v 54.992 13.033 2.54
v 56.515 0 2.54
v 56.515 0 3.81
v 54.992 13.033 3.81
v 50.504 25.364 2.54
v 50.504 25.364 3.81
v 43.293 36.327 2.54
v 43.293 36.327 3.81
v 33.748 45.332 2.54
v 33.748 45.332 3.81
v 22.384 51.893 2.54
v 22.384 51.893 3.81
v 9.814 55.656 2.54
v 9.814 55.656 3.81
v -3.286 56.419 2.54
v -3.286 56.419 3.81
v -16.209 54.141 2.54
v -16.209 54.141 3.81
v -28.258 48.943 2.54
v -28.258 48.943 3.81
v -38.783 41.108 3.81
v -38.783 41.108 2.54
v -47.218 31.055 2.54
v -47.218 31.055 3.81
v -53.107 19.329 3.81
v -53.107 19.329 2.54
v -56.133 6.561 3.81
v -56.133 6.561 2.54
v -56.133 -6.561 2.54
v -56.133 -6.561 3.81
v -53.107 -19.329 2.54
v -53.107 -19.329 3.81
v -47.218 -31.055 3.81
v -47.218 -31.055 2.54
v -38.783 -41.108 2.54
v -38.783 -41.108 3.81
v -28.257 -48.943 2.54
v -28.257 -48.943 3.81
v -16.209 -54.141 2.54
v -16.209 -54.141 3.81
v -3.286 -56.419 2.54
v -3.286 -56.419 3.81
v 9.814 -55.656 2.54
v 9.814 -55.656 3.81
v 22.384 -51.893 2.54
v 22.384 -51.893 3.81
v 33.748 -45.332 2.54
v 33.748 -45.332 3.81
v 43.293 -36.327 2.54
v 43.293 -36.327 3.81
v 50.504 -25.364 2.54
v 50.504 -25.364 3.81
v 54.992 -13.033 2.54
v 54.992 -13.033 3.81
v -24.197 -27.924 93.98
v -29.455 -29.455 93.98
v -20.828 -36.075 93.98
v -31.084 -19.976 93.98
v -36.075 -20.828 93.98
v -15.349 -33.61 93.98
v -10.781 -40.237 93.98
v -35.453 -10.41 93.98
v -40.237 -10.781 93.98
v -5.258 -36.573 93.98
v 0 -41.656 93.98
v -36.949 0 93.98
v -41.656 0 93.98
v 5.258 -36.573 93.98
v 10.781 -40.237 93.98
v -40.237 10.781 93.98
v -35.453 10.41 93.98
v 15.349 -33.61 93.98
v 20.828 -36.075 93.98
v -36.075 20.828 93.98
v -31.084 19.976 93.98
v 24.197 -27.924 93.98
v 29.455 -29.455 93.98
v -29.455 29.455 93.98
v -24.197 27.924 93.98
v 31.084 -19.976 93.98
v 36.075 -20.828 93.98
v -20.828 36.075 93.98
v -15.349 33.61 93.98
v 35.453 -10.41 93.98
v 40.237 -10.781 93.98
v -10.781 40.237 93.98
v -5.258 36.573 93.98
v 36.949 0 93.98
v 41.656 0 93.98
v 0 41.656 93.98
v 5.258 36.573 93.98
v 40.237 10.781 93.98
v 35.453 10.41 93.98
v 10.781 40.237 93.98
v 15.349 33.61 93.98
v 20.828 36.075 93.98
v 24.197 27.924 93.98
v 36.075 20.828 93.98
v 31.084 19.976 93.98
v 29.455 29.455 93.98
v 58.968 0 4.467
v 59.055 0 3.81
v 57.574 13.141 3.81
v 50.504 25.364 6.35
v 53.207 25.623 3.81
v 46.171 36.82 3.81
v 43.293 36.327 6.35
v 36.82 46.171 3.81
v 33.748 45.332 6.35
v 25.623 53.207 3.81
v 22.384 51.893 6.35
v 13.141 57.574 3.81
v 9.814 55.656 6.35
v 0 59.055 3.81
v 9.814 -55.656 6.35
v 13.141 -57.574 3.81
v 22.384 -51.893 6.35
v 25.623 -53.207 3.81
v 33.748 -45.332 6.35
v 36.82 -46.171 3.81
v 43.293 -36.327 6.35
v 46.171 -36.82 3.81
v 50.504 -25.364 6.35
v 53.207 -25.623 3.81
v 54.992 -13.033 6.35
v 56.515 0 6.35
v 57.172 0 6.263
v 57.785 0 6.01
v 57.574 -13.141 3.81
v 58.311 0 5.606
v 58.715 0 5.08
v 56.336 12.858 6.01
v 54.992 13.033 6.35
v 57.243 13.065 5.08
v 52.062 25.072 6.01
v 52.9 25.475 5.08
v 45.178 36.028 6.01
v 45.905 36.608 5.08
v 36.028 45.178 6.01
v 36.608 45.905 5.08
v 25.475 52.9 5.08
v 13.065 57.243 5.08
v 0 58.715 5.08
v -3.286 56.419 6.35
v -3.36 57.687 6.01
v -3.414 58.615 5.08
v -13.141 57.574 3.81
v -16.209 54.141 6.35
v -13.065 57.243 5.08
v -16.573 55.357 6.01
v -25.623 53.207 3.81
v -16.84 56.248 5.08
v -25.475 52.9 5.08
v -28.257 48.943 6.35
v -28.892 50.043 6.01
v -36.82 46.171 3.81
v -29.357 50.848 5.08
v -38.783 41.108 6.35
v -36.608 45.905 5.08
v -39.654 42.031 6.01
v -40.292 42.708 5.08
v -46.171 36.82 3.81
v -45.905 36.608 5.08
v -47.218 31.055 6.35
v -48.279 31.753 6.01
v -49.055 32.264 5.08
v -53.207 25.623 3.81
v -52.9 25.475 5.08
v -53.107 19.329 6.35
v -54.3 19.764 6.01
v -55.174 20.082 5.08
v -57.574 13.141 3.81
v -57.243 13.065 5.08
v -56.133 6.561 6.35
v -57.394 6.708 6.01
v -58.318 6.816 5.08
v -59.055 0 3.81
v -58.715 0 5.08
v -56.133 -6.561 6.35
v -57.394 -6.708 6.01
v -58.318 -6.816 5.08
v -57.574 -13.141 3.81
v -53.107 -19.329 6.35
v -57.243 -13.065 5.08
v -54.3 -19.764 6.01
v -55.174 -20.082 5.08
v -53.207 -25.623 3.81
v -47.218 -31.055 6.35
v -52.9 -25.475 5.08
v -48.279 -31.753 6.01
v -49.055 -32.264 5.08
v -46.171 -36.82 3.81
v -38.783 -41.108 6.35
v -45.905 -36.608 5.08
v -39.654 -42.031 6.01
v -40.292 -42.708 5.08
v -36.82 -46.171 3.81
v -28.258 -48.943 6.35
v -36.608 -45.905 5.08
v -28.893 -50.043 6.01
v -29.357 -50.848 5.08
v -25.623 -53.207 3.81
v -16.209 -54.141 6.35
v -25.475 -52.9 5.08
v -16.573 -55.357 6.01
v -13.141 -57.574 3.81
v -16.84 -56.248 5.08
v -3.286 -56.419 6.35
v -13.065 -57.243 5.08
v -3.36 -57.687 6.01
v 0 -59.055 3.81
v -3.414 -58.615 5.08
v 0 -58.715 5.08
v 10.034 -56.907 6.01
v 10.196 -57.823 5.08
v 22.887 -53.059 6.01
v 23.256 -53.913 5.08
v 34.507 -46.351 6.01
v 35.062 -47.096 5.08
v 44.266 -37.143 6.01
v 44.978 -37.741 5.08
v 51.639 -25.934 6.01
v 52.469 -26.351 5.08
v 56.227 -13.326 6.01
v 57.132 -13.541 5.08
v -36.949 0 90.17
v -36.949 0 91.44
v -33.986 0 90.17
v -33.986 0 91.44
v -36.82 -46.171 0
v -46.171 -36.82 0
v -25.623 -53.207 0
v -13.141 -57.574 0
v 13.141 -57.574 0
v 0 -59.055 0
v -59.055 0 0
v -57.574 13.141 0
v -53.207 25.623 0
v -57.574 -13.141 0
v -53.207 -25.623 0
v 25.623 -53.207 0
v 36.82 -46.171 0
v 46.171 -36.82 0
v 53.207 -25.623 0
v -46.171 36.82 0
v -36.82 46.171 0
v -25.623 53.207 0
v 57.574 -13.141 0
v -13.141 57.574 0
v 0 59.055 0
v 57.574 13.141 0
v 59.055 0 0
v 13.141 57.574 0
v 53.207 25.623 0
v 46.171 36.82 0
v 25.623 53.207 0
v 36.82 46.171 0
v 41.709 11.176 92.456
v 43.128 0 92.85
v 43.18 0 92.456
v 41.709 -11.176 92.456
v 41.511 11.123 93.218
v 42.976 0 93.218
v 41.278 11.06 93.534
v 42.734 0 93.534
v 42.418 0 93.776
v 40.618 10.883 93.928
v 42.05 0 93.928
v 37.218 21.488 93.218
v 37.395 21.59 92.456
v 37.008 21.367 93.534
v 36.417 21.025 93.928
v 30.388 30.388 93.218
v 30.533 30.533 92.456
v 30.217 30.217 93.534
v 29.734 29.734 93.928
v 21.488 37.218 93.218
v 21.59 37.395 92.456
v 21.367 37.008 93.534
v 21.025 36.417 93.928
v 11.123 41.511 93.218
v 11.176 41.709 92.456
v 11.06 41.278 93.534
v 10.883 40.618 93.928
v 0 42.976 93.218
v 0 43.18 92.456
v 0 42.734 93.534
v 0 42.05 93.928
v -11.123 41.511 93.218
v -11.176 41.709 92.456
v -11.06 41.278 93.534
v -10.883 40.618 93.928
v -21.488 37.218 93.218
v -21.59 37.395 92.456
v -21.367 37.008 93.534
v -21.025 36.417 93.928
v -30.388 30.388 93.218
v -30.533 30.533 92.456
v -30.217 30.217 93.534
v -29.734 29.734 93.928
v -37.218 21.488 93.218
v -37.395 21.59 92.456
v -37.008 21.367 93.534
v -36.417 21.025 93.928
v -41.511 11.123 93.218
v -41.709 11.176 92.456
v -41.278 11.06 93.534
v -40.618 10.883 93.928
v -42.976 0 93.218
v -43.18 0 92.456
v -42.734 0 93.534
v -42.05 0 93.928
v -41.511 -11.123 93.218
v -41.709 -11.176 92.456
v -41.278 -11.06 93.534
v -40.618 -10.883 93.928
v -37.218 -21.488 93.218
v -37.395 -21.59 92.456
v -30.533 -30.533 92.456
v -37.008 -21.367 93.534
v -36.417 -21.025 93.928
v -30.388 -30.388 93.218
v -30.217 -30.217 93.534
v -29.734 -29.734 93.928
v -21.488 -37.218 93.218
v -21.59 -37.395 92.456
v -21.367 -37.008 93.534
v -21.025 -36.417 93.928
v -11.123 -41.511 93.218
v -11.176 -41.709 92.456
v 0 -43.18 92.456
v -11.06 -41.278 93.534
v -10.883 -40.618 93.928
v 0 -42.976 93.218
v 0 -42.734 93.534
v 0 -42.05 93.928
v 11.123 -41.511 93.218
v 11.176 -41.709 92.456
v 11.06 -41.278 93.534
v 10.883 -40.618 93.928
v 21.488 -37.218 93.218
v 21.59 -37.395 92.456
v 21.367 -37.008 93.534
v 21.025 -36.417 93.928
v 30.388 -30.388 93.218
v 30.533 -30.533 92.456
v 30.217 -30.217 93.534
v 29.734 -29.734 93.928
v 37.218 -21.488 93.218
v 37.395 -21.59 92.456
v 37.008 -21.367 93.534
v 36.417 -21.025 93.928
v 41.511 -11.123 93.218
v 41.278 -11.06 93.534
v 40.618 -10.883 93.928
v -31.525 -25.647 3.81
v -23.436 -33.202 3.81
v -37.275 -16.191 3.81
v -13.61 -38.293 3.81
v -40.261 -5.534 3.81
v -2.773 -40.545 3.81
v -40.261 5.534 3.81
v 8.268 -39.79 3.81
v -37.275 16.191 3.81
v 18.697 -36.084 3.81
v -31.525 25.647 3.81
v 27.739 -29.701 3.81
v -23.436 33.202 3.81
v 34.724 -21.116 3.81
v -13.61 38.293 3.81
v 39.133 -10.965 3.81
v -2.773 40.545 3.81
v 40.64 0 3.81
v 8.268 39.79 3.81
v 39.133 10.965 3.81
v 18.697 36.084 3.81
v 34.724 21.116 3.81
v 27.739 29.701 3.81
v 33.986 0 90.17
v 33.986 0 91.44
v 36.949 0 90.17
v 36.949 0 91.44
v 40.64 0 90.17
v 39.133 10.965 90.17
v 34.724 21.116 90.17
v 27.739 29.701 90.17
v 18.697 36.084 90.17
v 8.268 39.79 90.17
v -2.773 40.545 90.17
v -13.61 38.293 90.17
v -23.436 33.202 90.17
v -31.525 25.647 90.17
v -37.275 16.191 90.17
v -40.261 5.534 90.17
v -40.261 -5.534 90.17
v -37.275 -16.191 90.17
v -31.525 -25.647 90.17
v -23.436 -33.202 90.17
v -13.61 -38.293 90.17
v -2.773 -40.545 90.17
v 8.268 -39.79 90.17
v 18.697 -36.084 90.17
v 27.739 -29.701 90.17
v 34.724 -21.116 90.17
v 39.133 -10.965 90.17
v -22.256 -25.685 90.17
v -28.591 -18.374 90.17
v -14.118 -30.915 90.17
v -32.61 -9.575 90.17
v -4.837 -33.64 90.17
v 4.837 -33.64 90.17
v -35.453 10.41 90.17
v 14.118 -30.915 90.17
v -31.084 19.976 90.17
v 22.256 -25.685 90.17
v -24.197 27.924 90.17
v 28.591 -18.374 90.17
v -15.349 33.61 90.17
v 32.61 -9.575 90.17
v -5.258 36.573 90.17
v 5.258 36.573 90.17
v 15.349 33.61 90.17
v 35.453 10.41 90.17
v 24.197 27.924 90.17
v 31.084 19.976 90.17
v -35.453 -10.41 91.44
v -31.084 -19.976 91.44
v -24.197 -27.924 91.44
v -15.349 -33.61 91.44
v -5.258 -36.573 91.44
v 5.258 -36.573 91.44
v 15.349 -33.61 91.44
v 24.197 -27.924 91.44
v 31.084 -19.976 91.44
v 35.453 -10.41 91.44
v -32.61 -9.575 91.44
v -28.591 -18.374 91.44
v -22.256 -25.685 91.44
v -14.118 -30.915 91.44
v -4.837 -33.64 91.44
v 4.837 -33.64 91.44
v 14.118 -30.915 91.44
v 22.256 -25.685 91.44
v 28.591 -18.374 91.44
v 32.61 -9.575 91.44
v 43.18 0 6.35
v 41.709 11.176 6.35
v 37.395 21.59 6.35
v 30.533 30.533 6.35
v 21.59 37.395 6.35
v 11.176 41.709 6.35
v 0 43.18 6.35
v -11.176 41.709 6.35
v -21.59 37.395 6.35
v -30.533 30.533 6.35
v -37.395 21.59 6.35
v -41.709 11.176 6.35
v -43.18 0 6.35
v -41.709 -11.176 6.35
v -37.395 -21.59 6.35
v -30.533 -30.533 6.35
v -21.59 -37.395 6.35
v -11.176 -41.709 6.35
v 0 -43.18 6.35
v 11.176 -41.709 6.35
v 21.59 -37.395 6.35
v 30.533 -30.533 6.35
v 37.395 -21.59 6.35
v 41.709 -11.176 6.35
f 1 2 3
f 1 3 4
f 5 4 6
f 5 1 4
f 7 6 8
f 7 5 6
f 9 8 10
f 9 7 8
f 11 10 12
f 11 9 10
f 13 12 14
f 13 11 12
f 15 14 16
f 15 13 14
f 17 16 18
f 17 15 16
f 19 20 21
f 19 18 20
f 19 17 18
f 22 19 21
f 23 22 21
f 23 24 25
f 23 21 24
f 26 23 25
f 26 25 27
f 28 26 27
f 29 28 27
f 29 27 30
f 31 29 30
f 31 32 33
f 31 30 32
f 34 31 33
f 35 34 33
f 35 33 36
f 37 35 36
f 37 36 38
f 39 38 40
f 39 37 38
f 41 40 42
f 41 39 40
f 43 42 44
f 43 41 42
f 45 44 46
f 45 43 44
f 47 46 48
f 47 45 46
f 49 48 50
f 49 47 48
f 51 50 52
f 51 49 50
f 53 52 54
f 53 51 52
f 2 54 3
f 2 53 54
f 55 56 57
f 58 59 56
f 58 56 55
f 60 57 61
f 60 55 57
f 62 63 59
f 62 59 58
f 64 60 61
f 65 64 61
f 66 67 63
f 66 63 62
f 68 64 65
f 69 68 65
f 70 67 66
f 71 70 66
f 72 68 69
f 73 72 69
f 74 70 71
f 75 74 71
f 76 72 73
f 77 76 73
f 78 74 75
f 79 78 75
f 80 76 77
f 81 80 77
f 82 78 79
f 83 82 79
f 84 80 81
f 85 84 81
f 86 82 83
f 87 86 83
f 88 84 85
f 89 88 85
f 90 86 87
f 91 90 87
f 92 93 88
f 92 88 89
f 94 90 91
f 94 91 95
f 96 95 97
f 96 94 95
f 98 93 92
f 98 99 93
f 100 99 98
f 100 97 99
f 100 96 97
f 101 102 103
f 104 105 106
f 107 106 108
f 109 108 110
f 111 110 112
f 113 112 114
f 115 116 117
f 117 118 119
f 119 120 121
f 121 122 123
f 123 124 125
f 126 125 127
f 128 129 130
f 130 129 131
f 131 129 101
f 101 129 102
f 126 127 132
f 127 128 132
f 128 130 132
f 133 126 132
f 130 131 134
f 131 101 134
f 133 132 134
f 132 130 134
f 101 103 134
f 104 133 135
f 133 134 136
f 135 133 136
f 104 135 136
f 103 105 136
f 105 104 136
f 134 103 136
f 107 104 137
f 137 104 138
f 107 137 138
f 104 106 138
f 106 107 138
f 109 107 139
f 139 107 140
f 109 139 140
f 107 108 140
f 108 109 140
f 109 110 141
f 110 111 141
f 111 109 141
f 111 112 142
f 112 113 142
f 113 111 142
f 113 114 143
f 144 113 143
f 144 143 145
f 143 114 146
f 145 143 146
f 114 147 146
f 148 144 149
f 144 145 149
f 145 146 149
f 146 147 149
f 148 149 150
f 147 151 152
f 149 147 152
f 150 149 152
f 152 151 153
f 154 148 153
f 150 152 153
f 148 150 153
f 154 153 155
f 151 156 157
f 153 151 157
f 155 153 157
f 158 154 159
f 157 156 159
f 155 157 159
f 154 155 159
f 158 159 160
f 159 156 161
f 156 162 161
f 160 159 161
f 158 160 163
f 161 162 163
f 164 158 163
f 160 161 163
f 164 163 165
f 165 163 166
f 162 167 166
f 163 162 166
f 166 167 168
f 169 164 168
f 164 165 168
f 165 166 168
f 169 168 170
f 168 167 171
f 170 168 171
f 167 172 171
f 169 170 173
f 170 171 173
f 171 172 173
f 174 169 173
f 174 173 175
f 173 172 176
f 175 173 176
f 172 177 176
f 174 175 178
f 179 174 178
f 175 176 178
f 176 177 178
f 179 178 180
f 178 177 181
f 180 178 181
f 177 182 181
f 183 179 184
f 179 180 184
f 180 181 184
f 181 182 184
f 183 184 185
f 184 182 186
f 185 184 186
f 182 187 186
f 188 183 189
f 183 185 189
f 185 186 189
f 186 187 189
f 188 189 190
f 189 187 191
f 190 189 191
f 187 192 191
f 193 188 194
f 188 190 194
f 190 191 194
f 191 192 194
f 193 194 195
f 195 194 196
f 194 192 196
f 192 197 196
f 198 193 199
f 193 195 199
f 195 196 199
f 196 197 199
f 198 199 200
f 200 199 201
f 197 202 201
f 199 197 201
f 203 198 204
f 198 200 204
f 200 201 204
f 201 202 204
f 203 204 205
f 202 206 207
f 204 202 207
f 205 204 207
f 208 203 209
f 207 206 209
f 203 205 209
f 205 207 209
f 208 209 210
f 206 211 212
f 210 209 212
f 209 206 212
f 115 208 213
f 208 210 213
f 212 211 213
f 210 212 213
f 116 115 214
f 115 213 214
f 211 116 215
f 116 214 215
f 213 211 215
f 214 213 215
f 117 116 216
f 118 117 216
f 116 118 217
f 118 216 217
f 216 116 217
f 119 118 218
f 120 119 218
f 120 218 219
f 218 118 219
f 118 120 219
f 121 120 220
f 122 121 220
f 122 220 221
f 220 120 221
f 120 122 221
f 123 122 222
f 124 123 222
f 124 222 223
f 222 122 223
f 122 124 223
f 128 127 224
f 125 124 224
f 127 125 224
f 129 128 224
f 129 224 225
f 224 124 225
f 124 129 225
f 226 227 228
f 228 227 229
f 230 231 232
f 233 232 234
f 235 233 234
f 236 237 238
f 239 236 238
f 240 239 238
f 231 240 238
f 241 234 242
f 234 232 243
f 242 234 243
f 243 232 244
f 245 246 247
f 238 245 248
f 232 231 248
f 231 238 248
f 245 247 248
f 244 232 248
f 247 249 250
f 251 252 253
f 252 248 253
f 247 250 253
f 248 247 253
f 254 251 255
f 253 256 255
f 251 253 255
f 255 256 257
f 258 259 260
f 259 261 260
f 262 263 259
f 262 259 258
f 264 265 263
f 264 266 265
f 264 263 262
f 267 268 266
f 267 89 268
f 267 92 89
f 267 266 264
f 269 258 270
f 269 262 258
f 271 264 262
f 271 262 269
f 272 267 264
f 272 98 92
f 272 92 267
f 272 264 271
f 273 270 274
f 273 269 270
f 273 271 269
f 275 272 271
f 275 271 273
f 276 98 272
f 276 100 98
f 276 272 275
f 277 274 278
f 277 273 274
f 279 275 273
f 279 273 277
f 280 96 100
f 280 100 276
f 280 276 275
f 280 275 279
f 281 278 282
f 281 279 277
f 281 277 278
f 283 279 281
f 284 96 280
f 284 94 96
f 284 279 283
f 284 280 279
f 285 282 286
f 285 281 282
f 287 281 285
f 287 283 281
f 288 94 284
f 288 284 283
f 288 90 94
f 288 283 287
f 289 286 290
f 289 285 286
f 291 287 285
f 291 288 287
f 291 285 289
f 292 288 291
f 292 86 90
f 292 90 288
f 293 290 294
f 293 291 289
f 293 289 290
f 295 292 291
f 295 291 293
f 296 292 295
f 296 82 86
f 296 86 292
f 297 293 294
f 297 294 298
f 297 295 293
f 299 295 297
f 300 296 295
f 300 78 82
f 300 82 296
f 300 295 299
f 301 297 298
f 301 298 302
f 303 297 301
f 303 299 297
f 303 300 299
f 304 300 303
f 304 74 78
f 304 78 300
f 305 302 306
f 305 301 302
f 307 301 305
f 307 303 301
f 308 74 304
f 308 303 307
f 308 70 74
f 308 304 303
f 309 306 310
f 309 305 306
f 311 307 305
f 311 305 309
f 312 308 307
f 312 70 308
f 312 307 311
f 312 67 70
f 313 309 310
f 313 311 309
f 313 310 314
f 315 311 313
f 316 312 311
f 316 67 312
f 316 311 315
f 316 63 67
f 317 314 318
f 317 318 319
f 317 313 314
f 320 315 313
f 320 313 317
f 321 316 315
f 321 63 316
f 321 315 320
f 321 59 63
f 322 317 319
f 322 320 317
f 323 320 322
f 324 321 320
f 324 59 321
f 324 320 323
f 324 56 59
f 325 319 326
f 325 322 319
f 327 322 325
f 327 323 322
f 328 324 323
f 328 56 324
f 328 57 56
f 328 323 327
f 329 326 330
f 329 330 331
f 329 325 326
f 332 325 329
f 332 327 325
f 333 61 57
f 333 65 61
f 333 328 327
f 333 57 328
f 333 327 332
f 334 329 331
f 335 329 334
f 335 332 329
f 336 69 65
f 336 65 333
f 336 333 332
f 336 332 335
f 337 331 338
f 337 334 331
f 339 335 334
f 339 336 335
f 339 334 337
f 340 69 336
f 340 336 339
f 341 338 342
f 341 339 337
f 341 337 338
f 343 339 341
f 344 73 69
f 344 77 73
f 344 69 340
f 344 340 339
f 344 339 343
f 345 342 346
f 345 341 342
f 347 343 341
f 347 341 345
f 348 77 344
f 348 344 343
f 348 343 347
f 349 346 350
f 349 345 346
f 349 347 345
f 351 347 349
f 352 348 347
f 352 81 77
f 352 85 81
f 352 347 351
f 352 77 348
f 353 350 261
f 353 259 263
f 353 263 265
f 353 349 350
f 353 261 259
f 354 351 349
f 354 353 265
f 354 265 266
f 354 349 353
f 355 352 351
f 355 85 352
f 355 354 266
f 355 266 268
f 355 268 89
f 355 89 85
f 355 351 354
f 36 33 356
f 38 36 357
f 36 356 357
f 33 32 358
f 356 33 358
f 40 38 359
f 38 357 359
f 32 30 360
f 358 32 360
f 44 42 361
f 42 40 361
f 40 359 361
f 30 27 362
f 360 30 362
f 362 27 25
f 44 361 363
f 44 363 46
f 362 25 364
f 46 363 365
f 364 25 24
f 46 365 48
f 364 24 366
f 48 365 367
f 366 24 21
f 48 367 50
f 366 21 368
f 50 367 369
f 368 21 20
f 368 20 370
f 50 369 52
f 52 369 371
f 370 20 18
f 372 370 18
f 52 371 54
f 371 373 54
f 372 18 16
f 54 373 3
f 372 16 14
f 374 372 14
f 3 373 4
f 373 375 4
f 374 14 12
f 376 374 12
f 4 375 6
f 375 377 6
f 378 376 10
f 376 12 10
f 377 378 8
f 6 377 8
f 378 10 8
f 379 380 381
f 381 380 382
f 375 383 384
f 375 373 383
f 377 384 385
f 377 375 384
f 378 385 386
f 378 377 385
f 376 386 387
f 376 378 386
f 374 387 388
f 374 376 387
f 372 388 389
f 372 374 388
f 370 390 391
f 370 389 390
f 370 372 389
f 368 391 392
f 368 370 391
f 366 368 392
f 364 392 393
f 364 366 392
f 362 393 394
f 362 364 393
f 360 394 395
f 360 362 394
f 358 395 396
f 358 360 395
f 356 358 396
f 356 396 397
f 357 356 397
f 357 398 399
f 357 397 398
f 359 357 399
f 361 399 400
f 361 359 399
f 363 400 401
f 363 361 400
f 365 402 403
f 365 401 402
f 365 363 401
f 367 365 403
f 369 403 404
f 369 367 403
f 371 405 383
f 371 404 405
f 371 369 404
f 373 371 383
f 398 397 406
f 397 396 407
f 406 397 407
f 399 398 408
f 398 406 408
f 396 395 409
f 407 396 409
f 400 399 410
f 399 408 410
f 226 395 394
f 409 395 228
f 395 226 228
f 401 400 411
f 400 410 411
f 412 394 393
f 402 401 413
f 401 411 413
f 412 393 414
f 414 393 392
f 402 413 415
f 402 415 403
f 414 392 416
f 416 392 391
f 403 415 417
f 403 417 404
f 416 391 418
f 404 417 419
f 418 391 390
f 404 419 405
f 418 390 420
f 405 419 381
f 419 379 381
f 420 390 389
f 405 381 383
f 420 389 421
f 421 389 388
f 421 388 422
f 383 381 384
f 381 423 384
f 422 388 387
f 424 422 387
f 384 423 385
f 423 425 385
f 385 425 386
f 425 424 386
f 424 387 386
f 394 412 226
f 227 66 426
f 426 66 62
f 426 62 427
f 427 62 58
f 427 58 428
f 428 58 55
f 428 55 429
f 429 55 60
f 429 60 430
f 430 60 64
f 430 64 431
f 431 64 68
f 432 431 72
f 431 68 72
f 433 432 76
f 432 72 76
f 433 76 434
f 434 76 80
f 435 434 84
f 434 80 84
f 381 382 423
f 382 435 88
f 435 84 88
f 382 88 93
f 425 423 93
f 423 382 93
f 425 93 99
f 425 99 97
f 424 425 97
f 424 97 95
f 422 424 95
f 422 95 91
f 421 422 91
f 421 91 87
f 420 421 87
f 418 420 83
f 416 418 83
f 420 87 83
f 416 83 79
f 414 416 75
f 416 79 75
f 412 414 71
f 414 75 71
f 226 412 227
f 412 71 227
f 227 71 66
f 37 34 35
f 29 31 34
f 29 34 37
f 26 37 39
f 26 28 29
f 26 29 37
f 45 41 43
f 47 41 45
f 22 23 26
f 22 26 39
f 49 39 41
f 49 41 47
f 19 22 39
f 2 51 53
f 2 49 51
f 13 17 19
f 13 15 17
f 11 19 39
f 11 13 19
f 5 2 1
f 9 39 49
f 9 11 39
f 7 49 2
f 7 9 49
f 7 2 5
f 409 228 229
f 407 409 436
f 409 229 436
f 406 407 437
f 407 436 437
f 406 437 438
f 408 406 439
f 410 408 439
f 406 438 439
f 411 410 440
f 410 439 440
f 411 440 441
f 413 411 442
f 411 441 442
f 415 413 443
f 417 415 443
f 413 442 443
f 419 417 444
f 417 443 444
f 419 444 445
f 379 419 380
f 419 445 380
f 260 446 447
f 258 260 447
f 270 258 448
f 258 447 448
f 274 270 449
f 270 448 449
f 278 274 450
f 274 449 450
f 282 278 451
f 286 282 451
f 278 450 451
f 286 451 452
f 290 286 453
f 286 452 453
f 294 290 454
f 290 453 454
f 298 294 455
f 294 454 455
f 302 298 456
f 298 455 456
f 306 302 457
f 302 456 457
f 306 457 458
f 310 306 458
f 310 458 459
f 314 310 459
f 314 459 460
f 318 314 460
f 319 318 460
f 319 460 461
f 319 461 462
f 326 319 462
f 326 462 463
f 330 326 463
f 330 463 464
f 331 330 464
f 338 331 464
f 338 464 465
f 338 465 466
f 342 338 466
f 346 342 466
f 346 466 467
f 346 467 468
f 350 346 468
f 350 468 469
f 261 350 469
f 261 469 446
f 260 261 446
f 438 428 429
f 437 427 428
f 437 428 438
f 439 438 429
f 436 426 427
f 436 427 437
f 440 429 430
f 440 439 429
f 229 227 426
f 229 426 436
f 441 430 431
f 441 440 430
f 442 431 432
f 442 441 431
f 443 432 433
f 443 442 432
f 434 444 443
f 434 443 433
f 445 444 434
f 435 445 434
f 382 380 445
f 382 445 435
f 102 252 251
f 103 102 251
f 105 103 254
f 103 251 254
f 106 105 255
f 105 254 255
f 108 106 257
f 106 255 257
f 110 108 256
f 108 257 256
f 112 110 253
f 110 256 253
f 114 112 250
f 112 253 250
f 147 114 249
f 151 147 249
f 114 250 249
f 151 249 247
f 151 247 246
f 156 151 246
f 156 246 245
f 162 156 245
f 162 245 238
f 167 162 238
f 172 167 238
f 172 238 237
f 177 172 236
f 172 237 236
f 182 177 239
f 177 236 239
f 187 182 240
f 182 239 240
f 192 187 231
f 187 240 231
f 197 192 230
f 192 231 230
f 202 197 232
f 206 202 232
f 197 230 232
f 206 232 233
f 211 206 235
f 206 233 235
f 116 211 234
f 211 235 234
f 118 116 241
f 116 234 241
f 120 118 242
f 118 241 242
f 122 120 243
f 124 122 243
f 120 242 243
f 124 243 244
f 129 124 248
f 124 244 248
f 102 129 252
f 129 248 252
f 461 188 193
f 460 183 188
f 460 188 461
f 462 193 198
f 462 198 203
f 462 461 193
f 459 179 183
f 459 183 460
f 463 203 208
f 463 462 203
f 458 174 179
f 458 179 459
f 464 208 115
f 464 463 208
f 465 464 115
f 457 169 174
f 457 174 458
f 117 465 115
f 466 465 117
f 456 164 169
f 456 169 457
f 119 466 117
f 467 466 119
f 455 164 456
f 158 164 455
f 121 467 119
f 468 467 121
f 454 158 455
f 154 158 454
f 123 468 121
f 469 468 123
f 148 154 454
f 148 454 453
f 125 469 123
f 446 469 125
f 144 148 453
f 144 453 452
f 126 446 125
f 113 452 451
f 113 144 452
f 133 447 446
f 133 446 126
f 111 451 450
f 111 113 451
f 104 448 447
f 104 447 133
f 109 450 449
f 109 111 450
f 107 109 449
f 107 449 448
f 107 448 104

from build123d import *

# Parameters (mm, degrees)
F0_R     = 43.18
F1_DEPTH = 90.17
F0_R_2   = 59.055
F2_DEPTH = 6.35
F3_T     = -2.54
F4_R     = 43.18
F5_DEPTH = 3.81
F7_DEPTH = 3.81
F8_DEPTH = 2.54
F9_R     = 2.54
F10_R    = 1.524


with BuildPart() as f1:
    # F0 (on Top) → F1 (new body)
    with BuildSketch(Plane.XY):
        Circle(F0_R)
    extrude(amount=F1_DEPTH)

    # F0 (on Top) → F2 (join)
    with BuildSketch(Plane.XY):
        Circle(F0_R_2)
        Circle(F0_R, mode=Mode.SUBTRACT)
    extrude(amount=F2_DEPTH)

    # F3
    f3_openings = [f1.faces().sort_by_distance(p)[0] for p in [
        (0, 0, 90.17),
    ]]
    offset(amount=F3_T, openings=f3_openings, kind=Kind.INTERSECTION)

    # F4 (on face) → F5 (join)
    with BuildSketch(Plane.XY.offset(90.17)):
        Circle(F4_R)
    extrude(amount=F5_DEPTH)

    # F6 (on face) → F7 (cut, through all)
    with BuildSketch(Plane.XY.offset(93.98)):
        with BuildLine():
            ThreePointArc((-33.986308275, 0), (0, -33.986308275), (33.986308275, 0))
            ThreePointArc((33.986308275, 0), (0, 33.986308275), (-33.986308275, 0))
        make_face()
        with BuildLine():
            Line((33.986308275, 0), (36.9492512699, 0))
            ThreePointArc((36.9492512699, 0), (0, 36.9492512699), (-36.9492512699, 0))
            Line((-36.9492512699, 0), (-33.986308275, 0))
            ThreePointArc((-33.986308275, 0), (0, 33.986308275), (33.986308275, 0))
        make_face()
    extrude(amount=-F7_DEPTH, mode=Mode.SUBTRACT)

    # F6 (on face) → F8 (cut)
    with BuildSketch(Plane.XY.offset(93.98)):
        with BuildLine():
            ThreePointArc((-36.9492512699, 0), (0, -36.9492512699), (36.9492512699, 0))
            Line((36.9492512699, 0), (33.986308275, 0))
            ThreePointArc((33.986308275, 0), (0, -33.986308275), (-33.986308275, 0))
            Line((-33.986308275, 0), (-36.9492512699, 0))
        make_face()
    extrude(amount=-F8_DEPTH, mode=Mode.SUBTRACT)

    # F9
    f9_edges = [f1.edges().sort_by_distance(p)[0] for p in [
        (-59.055, 0, 6.35),
    ]]
    fillet(f9_edges, radius=F9_R)

    # F10
    f10_edges = [f1.edges().sort_by_distance(p)[0] for p in [
        (-43.18, 0, 93.98),
    ]]
    fillet(f10_edges, radius=F10_R)


solid = f1.part
